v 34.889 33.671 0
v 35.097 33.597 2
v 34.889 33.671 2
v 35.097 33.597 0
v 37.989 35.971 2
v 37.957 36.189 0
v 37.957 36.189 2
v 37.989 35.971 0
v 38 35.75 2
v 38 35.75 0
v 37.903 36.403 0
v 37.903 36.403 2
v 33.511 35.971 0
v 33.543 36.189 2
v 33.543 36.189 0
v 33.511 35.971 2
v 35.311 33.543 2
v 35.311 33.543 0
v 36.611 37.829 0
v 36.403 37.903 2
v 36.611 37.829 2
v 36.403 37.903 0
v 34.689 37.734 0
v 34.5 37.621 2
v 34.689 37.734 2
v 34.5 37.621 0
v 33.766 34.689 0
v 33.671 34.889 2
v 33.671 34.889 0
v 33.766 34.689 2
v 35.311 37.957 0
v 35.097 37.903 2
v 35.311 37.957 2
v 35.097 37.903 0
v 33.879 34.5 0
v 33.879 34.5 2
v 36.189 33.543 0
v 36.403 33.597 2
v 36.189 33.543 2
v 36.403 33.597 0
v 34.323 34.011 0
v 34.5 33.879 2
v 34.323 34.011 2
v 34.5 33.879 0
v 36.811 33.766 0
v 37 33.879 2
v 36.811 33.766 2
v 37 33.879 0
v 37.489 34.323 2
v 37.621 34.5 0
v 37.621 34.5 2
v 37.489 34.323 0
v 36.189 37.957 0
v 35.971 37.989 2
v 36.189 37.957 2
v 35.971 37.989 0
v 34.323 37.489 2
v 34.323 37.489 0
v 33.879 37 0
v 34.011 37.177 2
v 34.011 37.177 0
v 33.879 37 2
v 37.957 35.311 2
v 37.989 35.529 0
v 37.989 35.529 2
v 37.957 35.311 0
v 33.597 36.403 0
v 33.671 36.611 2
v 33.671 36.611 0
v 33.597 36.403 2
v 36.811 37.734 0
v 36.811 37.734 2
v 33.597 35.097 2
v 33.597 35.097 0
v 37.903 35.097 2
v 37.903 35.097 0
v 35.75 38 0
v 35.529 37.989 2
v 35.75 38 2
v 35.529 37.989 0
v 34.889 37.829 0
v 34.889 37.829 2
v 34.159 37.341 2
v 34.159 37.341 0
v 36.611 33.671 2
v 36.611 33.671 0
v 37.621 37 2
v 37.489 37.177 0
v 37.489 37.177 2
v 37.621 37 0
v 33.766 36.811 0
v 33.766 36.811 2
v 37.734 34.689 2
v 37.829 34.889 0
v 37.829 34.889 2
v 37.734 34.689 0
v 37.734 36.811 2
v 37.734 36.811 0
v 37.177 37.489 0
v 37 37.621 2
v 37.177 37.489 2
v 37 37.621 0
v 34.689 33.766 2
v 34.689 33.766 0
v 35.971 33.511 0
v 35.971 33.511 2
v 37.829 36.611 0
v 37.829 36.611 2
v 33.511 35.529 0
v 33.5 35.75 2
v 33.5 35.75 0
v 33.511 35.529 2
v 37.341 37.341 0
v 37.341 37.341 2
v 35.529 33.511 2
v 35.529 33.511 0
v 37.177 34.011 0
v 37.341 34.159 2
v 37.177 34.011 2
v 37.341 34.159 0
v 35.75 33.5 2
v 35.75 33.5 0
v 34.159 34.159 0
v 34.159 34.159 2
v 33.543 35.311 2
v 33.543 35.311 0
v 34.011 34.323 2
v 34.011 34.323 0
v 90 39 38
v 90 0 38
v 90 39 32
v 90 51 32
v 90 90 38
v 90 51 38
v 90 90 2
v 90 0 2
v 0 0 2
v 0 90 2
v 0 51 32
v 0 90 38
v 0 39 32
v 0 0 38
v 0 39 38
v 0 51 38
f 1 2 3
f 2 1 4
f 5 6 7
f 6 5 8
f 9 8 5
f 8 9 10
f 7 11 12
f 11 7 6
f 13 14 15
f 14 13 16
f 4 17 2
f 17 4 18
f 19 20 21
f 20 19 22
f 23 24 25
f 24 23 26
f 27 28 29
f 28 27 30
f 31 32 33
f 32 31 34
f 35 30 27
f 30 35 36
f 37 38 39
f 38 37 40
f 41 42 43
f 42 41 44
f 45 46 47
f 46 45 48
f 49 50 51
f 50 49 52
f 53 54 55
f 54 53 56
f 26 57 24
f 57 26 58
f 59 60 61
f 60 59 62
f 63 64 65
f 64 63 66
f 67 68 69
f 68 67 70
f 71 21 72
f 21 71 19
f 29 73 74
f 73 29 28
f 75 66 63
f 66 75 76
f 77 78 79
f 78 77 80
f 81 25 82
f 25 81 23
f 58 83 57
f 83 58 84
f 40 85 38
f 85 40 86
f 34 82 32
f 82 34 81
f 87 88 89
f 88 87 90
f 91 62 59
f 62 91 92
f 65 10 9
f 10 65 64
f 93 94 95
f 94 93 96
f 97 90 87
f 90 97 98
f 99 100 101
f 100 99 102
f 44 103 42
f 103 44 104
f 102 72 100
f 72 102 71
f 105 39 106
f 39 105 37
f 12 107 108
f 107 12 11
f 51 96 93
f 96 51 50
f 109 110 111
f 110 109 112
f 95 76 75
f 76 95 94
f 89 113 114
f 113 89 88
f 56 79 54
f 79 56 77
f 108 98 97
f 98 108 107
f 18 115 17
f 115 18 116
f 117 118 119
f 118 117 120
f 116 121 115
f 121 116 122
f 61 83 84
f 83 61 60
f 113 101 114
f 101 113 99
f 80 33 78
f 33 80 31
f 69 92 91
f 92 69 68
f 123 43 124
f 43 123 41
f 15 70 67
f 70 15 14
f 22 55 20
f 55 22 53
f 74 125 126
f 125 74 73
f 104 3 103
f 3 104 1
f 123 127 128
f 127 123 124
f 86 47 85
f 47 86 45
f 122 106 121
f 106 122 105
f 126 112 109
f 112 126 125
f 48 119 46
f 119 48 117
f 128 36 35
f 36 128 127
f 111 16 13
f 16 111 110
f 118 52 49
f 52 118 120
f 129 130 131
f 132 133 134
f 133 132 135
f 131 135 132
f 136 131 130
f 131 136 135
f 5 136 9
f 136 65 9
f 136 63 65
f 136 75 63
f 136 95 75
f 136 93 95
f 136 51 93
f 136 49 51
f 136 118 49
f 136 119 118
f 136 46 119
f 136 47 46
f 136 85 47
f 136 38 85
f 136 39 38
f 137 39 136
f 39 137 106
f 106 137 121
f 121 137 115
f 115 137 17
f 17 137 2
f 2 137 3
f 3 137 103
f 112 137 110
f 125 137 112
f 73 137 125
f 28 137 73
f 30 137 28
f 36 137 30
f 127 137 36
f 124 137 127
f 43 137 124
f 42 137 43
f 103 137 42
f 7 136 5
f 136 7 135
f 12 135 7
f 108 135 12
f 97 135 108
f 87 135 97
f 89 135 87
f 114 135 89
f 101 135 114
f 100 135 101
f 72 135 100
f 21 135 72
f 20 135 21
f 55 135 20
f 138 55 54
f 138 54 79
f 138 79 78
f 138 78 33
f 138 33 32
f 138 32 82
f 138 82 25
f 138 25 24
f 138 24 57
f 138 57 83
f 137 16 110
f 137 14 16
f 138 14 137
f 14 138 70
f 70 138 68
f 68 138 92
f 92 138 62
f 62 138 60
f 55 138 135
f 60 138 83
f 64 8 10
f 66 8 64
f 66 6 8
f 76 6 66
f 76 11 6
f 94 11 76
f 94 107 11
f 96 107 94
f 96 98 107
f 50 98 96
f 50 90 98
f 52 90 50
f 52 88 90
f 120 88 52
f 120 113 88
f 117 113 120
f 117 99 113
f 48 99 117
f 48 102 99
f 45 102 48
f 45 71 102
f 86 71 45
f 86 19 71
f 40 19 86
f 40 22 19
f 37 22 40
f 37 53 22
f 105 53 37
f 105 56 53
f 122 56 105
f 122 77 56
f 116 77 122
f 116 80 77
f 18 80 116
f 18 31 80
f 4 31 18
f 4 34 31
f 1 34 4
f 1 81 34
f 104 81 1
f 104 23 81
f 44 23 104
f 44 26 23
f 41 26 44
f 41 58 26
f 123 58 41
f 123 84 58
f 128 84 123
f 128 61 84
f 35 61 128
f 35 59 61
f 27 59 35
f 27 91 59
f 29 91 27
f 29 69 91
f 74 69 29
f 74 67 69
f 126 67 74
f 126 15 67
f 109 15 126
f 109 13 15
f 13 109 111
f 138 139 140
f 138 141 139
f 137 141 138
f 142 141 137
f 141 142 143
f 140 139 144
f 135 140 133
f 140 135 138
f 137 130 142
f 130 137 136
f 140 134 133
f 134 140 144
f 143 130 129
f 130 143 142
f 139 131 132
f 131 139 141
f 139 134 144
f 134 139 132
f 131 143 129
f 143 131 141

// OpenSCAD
// DIY magnetic stirrer housing - upside-down open box over a 80 mm PC fan
// Print orientation: top plate on bed (z = 0), walls rise to open top (z = 40)

$fn = 64;

// ---- Dimensions (mm) ----
plate_t      = 2;     // top plate thickness
wall_t       = 2.5;   // wall thickness
box_h        = 40;    // total height (open top at z = 40)
outer        = 90;    // outer size in X and Y
screw_pat    = 71.5;  // square pitch of M4 screw holes
screw_d      = 4.5;   // M4 screw hole diameter
cable_notch_w = 12;   // cable notch width
cable_notch_d = 8;    // cable notch depth from open edge (z = 32 to 40)
eps          = 0.5;   // cutter overshoot past faces

// ---- Model ----
difference() {
    // Outer box: outer size x x y, height h, open top (h = box_h - plate_t)
    cube([outer, outer, box_h - plate_t]);

    // Closed top plate, z = 0..plate_t, with M4 screw holes on square pattern
    translate([0, 0, 0])
        difference() {
            cube([outer, outer, plate_t]);
            for (i = [-1, 1])
                for (j = [-1, 1])
                    translate([i * screw_pat / 2, j * screw_pat / 2, -eps])
                        cylinder(d = screw_d, h = plate_t + 2 * eps);
        }

    // Cable notch in one wall: width w, depth d from open edge, centred along wall
    translate([0, outer / 2 - cable_notch_w / 2, box_h - cable_notch_d])
        cube([outer, cable_notch_w, cable_notch_d + eps]);
}
